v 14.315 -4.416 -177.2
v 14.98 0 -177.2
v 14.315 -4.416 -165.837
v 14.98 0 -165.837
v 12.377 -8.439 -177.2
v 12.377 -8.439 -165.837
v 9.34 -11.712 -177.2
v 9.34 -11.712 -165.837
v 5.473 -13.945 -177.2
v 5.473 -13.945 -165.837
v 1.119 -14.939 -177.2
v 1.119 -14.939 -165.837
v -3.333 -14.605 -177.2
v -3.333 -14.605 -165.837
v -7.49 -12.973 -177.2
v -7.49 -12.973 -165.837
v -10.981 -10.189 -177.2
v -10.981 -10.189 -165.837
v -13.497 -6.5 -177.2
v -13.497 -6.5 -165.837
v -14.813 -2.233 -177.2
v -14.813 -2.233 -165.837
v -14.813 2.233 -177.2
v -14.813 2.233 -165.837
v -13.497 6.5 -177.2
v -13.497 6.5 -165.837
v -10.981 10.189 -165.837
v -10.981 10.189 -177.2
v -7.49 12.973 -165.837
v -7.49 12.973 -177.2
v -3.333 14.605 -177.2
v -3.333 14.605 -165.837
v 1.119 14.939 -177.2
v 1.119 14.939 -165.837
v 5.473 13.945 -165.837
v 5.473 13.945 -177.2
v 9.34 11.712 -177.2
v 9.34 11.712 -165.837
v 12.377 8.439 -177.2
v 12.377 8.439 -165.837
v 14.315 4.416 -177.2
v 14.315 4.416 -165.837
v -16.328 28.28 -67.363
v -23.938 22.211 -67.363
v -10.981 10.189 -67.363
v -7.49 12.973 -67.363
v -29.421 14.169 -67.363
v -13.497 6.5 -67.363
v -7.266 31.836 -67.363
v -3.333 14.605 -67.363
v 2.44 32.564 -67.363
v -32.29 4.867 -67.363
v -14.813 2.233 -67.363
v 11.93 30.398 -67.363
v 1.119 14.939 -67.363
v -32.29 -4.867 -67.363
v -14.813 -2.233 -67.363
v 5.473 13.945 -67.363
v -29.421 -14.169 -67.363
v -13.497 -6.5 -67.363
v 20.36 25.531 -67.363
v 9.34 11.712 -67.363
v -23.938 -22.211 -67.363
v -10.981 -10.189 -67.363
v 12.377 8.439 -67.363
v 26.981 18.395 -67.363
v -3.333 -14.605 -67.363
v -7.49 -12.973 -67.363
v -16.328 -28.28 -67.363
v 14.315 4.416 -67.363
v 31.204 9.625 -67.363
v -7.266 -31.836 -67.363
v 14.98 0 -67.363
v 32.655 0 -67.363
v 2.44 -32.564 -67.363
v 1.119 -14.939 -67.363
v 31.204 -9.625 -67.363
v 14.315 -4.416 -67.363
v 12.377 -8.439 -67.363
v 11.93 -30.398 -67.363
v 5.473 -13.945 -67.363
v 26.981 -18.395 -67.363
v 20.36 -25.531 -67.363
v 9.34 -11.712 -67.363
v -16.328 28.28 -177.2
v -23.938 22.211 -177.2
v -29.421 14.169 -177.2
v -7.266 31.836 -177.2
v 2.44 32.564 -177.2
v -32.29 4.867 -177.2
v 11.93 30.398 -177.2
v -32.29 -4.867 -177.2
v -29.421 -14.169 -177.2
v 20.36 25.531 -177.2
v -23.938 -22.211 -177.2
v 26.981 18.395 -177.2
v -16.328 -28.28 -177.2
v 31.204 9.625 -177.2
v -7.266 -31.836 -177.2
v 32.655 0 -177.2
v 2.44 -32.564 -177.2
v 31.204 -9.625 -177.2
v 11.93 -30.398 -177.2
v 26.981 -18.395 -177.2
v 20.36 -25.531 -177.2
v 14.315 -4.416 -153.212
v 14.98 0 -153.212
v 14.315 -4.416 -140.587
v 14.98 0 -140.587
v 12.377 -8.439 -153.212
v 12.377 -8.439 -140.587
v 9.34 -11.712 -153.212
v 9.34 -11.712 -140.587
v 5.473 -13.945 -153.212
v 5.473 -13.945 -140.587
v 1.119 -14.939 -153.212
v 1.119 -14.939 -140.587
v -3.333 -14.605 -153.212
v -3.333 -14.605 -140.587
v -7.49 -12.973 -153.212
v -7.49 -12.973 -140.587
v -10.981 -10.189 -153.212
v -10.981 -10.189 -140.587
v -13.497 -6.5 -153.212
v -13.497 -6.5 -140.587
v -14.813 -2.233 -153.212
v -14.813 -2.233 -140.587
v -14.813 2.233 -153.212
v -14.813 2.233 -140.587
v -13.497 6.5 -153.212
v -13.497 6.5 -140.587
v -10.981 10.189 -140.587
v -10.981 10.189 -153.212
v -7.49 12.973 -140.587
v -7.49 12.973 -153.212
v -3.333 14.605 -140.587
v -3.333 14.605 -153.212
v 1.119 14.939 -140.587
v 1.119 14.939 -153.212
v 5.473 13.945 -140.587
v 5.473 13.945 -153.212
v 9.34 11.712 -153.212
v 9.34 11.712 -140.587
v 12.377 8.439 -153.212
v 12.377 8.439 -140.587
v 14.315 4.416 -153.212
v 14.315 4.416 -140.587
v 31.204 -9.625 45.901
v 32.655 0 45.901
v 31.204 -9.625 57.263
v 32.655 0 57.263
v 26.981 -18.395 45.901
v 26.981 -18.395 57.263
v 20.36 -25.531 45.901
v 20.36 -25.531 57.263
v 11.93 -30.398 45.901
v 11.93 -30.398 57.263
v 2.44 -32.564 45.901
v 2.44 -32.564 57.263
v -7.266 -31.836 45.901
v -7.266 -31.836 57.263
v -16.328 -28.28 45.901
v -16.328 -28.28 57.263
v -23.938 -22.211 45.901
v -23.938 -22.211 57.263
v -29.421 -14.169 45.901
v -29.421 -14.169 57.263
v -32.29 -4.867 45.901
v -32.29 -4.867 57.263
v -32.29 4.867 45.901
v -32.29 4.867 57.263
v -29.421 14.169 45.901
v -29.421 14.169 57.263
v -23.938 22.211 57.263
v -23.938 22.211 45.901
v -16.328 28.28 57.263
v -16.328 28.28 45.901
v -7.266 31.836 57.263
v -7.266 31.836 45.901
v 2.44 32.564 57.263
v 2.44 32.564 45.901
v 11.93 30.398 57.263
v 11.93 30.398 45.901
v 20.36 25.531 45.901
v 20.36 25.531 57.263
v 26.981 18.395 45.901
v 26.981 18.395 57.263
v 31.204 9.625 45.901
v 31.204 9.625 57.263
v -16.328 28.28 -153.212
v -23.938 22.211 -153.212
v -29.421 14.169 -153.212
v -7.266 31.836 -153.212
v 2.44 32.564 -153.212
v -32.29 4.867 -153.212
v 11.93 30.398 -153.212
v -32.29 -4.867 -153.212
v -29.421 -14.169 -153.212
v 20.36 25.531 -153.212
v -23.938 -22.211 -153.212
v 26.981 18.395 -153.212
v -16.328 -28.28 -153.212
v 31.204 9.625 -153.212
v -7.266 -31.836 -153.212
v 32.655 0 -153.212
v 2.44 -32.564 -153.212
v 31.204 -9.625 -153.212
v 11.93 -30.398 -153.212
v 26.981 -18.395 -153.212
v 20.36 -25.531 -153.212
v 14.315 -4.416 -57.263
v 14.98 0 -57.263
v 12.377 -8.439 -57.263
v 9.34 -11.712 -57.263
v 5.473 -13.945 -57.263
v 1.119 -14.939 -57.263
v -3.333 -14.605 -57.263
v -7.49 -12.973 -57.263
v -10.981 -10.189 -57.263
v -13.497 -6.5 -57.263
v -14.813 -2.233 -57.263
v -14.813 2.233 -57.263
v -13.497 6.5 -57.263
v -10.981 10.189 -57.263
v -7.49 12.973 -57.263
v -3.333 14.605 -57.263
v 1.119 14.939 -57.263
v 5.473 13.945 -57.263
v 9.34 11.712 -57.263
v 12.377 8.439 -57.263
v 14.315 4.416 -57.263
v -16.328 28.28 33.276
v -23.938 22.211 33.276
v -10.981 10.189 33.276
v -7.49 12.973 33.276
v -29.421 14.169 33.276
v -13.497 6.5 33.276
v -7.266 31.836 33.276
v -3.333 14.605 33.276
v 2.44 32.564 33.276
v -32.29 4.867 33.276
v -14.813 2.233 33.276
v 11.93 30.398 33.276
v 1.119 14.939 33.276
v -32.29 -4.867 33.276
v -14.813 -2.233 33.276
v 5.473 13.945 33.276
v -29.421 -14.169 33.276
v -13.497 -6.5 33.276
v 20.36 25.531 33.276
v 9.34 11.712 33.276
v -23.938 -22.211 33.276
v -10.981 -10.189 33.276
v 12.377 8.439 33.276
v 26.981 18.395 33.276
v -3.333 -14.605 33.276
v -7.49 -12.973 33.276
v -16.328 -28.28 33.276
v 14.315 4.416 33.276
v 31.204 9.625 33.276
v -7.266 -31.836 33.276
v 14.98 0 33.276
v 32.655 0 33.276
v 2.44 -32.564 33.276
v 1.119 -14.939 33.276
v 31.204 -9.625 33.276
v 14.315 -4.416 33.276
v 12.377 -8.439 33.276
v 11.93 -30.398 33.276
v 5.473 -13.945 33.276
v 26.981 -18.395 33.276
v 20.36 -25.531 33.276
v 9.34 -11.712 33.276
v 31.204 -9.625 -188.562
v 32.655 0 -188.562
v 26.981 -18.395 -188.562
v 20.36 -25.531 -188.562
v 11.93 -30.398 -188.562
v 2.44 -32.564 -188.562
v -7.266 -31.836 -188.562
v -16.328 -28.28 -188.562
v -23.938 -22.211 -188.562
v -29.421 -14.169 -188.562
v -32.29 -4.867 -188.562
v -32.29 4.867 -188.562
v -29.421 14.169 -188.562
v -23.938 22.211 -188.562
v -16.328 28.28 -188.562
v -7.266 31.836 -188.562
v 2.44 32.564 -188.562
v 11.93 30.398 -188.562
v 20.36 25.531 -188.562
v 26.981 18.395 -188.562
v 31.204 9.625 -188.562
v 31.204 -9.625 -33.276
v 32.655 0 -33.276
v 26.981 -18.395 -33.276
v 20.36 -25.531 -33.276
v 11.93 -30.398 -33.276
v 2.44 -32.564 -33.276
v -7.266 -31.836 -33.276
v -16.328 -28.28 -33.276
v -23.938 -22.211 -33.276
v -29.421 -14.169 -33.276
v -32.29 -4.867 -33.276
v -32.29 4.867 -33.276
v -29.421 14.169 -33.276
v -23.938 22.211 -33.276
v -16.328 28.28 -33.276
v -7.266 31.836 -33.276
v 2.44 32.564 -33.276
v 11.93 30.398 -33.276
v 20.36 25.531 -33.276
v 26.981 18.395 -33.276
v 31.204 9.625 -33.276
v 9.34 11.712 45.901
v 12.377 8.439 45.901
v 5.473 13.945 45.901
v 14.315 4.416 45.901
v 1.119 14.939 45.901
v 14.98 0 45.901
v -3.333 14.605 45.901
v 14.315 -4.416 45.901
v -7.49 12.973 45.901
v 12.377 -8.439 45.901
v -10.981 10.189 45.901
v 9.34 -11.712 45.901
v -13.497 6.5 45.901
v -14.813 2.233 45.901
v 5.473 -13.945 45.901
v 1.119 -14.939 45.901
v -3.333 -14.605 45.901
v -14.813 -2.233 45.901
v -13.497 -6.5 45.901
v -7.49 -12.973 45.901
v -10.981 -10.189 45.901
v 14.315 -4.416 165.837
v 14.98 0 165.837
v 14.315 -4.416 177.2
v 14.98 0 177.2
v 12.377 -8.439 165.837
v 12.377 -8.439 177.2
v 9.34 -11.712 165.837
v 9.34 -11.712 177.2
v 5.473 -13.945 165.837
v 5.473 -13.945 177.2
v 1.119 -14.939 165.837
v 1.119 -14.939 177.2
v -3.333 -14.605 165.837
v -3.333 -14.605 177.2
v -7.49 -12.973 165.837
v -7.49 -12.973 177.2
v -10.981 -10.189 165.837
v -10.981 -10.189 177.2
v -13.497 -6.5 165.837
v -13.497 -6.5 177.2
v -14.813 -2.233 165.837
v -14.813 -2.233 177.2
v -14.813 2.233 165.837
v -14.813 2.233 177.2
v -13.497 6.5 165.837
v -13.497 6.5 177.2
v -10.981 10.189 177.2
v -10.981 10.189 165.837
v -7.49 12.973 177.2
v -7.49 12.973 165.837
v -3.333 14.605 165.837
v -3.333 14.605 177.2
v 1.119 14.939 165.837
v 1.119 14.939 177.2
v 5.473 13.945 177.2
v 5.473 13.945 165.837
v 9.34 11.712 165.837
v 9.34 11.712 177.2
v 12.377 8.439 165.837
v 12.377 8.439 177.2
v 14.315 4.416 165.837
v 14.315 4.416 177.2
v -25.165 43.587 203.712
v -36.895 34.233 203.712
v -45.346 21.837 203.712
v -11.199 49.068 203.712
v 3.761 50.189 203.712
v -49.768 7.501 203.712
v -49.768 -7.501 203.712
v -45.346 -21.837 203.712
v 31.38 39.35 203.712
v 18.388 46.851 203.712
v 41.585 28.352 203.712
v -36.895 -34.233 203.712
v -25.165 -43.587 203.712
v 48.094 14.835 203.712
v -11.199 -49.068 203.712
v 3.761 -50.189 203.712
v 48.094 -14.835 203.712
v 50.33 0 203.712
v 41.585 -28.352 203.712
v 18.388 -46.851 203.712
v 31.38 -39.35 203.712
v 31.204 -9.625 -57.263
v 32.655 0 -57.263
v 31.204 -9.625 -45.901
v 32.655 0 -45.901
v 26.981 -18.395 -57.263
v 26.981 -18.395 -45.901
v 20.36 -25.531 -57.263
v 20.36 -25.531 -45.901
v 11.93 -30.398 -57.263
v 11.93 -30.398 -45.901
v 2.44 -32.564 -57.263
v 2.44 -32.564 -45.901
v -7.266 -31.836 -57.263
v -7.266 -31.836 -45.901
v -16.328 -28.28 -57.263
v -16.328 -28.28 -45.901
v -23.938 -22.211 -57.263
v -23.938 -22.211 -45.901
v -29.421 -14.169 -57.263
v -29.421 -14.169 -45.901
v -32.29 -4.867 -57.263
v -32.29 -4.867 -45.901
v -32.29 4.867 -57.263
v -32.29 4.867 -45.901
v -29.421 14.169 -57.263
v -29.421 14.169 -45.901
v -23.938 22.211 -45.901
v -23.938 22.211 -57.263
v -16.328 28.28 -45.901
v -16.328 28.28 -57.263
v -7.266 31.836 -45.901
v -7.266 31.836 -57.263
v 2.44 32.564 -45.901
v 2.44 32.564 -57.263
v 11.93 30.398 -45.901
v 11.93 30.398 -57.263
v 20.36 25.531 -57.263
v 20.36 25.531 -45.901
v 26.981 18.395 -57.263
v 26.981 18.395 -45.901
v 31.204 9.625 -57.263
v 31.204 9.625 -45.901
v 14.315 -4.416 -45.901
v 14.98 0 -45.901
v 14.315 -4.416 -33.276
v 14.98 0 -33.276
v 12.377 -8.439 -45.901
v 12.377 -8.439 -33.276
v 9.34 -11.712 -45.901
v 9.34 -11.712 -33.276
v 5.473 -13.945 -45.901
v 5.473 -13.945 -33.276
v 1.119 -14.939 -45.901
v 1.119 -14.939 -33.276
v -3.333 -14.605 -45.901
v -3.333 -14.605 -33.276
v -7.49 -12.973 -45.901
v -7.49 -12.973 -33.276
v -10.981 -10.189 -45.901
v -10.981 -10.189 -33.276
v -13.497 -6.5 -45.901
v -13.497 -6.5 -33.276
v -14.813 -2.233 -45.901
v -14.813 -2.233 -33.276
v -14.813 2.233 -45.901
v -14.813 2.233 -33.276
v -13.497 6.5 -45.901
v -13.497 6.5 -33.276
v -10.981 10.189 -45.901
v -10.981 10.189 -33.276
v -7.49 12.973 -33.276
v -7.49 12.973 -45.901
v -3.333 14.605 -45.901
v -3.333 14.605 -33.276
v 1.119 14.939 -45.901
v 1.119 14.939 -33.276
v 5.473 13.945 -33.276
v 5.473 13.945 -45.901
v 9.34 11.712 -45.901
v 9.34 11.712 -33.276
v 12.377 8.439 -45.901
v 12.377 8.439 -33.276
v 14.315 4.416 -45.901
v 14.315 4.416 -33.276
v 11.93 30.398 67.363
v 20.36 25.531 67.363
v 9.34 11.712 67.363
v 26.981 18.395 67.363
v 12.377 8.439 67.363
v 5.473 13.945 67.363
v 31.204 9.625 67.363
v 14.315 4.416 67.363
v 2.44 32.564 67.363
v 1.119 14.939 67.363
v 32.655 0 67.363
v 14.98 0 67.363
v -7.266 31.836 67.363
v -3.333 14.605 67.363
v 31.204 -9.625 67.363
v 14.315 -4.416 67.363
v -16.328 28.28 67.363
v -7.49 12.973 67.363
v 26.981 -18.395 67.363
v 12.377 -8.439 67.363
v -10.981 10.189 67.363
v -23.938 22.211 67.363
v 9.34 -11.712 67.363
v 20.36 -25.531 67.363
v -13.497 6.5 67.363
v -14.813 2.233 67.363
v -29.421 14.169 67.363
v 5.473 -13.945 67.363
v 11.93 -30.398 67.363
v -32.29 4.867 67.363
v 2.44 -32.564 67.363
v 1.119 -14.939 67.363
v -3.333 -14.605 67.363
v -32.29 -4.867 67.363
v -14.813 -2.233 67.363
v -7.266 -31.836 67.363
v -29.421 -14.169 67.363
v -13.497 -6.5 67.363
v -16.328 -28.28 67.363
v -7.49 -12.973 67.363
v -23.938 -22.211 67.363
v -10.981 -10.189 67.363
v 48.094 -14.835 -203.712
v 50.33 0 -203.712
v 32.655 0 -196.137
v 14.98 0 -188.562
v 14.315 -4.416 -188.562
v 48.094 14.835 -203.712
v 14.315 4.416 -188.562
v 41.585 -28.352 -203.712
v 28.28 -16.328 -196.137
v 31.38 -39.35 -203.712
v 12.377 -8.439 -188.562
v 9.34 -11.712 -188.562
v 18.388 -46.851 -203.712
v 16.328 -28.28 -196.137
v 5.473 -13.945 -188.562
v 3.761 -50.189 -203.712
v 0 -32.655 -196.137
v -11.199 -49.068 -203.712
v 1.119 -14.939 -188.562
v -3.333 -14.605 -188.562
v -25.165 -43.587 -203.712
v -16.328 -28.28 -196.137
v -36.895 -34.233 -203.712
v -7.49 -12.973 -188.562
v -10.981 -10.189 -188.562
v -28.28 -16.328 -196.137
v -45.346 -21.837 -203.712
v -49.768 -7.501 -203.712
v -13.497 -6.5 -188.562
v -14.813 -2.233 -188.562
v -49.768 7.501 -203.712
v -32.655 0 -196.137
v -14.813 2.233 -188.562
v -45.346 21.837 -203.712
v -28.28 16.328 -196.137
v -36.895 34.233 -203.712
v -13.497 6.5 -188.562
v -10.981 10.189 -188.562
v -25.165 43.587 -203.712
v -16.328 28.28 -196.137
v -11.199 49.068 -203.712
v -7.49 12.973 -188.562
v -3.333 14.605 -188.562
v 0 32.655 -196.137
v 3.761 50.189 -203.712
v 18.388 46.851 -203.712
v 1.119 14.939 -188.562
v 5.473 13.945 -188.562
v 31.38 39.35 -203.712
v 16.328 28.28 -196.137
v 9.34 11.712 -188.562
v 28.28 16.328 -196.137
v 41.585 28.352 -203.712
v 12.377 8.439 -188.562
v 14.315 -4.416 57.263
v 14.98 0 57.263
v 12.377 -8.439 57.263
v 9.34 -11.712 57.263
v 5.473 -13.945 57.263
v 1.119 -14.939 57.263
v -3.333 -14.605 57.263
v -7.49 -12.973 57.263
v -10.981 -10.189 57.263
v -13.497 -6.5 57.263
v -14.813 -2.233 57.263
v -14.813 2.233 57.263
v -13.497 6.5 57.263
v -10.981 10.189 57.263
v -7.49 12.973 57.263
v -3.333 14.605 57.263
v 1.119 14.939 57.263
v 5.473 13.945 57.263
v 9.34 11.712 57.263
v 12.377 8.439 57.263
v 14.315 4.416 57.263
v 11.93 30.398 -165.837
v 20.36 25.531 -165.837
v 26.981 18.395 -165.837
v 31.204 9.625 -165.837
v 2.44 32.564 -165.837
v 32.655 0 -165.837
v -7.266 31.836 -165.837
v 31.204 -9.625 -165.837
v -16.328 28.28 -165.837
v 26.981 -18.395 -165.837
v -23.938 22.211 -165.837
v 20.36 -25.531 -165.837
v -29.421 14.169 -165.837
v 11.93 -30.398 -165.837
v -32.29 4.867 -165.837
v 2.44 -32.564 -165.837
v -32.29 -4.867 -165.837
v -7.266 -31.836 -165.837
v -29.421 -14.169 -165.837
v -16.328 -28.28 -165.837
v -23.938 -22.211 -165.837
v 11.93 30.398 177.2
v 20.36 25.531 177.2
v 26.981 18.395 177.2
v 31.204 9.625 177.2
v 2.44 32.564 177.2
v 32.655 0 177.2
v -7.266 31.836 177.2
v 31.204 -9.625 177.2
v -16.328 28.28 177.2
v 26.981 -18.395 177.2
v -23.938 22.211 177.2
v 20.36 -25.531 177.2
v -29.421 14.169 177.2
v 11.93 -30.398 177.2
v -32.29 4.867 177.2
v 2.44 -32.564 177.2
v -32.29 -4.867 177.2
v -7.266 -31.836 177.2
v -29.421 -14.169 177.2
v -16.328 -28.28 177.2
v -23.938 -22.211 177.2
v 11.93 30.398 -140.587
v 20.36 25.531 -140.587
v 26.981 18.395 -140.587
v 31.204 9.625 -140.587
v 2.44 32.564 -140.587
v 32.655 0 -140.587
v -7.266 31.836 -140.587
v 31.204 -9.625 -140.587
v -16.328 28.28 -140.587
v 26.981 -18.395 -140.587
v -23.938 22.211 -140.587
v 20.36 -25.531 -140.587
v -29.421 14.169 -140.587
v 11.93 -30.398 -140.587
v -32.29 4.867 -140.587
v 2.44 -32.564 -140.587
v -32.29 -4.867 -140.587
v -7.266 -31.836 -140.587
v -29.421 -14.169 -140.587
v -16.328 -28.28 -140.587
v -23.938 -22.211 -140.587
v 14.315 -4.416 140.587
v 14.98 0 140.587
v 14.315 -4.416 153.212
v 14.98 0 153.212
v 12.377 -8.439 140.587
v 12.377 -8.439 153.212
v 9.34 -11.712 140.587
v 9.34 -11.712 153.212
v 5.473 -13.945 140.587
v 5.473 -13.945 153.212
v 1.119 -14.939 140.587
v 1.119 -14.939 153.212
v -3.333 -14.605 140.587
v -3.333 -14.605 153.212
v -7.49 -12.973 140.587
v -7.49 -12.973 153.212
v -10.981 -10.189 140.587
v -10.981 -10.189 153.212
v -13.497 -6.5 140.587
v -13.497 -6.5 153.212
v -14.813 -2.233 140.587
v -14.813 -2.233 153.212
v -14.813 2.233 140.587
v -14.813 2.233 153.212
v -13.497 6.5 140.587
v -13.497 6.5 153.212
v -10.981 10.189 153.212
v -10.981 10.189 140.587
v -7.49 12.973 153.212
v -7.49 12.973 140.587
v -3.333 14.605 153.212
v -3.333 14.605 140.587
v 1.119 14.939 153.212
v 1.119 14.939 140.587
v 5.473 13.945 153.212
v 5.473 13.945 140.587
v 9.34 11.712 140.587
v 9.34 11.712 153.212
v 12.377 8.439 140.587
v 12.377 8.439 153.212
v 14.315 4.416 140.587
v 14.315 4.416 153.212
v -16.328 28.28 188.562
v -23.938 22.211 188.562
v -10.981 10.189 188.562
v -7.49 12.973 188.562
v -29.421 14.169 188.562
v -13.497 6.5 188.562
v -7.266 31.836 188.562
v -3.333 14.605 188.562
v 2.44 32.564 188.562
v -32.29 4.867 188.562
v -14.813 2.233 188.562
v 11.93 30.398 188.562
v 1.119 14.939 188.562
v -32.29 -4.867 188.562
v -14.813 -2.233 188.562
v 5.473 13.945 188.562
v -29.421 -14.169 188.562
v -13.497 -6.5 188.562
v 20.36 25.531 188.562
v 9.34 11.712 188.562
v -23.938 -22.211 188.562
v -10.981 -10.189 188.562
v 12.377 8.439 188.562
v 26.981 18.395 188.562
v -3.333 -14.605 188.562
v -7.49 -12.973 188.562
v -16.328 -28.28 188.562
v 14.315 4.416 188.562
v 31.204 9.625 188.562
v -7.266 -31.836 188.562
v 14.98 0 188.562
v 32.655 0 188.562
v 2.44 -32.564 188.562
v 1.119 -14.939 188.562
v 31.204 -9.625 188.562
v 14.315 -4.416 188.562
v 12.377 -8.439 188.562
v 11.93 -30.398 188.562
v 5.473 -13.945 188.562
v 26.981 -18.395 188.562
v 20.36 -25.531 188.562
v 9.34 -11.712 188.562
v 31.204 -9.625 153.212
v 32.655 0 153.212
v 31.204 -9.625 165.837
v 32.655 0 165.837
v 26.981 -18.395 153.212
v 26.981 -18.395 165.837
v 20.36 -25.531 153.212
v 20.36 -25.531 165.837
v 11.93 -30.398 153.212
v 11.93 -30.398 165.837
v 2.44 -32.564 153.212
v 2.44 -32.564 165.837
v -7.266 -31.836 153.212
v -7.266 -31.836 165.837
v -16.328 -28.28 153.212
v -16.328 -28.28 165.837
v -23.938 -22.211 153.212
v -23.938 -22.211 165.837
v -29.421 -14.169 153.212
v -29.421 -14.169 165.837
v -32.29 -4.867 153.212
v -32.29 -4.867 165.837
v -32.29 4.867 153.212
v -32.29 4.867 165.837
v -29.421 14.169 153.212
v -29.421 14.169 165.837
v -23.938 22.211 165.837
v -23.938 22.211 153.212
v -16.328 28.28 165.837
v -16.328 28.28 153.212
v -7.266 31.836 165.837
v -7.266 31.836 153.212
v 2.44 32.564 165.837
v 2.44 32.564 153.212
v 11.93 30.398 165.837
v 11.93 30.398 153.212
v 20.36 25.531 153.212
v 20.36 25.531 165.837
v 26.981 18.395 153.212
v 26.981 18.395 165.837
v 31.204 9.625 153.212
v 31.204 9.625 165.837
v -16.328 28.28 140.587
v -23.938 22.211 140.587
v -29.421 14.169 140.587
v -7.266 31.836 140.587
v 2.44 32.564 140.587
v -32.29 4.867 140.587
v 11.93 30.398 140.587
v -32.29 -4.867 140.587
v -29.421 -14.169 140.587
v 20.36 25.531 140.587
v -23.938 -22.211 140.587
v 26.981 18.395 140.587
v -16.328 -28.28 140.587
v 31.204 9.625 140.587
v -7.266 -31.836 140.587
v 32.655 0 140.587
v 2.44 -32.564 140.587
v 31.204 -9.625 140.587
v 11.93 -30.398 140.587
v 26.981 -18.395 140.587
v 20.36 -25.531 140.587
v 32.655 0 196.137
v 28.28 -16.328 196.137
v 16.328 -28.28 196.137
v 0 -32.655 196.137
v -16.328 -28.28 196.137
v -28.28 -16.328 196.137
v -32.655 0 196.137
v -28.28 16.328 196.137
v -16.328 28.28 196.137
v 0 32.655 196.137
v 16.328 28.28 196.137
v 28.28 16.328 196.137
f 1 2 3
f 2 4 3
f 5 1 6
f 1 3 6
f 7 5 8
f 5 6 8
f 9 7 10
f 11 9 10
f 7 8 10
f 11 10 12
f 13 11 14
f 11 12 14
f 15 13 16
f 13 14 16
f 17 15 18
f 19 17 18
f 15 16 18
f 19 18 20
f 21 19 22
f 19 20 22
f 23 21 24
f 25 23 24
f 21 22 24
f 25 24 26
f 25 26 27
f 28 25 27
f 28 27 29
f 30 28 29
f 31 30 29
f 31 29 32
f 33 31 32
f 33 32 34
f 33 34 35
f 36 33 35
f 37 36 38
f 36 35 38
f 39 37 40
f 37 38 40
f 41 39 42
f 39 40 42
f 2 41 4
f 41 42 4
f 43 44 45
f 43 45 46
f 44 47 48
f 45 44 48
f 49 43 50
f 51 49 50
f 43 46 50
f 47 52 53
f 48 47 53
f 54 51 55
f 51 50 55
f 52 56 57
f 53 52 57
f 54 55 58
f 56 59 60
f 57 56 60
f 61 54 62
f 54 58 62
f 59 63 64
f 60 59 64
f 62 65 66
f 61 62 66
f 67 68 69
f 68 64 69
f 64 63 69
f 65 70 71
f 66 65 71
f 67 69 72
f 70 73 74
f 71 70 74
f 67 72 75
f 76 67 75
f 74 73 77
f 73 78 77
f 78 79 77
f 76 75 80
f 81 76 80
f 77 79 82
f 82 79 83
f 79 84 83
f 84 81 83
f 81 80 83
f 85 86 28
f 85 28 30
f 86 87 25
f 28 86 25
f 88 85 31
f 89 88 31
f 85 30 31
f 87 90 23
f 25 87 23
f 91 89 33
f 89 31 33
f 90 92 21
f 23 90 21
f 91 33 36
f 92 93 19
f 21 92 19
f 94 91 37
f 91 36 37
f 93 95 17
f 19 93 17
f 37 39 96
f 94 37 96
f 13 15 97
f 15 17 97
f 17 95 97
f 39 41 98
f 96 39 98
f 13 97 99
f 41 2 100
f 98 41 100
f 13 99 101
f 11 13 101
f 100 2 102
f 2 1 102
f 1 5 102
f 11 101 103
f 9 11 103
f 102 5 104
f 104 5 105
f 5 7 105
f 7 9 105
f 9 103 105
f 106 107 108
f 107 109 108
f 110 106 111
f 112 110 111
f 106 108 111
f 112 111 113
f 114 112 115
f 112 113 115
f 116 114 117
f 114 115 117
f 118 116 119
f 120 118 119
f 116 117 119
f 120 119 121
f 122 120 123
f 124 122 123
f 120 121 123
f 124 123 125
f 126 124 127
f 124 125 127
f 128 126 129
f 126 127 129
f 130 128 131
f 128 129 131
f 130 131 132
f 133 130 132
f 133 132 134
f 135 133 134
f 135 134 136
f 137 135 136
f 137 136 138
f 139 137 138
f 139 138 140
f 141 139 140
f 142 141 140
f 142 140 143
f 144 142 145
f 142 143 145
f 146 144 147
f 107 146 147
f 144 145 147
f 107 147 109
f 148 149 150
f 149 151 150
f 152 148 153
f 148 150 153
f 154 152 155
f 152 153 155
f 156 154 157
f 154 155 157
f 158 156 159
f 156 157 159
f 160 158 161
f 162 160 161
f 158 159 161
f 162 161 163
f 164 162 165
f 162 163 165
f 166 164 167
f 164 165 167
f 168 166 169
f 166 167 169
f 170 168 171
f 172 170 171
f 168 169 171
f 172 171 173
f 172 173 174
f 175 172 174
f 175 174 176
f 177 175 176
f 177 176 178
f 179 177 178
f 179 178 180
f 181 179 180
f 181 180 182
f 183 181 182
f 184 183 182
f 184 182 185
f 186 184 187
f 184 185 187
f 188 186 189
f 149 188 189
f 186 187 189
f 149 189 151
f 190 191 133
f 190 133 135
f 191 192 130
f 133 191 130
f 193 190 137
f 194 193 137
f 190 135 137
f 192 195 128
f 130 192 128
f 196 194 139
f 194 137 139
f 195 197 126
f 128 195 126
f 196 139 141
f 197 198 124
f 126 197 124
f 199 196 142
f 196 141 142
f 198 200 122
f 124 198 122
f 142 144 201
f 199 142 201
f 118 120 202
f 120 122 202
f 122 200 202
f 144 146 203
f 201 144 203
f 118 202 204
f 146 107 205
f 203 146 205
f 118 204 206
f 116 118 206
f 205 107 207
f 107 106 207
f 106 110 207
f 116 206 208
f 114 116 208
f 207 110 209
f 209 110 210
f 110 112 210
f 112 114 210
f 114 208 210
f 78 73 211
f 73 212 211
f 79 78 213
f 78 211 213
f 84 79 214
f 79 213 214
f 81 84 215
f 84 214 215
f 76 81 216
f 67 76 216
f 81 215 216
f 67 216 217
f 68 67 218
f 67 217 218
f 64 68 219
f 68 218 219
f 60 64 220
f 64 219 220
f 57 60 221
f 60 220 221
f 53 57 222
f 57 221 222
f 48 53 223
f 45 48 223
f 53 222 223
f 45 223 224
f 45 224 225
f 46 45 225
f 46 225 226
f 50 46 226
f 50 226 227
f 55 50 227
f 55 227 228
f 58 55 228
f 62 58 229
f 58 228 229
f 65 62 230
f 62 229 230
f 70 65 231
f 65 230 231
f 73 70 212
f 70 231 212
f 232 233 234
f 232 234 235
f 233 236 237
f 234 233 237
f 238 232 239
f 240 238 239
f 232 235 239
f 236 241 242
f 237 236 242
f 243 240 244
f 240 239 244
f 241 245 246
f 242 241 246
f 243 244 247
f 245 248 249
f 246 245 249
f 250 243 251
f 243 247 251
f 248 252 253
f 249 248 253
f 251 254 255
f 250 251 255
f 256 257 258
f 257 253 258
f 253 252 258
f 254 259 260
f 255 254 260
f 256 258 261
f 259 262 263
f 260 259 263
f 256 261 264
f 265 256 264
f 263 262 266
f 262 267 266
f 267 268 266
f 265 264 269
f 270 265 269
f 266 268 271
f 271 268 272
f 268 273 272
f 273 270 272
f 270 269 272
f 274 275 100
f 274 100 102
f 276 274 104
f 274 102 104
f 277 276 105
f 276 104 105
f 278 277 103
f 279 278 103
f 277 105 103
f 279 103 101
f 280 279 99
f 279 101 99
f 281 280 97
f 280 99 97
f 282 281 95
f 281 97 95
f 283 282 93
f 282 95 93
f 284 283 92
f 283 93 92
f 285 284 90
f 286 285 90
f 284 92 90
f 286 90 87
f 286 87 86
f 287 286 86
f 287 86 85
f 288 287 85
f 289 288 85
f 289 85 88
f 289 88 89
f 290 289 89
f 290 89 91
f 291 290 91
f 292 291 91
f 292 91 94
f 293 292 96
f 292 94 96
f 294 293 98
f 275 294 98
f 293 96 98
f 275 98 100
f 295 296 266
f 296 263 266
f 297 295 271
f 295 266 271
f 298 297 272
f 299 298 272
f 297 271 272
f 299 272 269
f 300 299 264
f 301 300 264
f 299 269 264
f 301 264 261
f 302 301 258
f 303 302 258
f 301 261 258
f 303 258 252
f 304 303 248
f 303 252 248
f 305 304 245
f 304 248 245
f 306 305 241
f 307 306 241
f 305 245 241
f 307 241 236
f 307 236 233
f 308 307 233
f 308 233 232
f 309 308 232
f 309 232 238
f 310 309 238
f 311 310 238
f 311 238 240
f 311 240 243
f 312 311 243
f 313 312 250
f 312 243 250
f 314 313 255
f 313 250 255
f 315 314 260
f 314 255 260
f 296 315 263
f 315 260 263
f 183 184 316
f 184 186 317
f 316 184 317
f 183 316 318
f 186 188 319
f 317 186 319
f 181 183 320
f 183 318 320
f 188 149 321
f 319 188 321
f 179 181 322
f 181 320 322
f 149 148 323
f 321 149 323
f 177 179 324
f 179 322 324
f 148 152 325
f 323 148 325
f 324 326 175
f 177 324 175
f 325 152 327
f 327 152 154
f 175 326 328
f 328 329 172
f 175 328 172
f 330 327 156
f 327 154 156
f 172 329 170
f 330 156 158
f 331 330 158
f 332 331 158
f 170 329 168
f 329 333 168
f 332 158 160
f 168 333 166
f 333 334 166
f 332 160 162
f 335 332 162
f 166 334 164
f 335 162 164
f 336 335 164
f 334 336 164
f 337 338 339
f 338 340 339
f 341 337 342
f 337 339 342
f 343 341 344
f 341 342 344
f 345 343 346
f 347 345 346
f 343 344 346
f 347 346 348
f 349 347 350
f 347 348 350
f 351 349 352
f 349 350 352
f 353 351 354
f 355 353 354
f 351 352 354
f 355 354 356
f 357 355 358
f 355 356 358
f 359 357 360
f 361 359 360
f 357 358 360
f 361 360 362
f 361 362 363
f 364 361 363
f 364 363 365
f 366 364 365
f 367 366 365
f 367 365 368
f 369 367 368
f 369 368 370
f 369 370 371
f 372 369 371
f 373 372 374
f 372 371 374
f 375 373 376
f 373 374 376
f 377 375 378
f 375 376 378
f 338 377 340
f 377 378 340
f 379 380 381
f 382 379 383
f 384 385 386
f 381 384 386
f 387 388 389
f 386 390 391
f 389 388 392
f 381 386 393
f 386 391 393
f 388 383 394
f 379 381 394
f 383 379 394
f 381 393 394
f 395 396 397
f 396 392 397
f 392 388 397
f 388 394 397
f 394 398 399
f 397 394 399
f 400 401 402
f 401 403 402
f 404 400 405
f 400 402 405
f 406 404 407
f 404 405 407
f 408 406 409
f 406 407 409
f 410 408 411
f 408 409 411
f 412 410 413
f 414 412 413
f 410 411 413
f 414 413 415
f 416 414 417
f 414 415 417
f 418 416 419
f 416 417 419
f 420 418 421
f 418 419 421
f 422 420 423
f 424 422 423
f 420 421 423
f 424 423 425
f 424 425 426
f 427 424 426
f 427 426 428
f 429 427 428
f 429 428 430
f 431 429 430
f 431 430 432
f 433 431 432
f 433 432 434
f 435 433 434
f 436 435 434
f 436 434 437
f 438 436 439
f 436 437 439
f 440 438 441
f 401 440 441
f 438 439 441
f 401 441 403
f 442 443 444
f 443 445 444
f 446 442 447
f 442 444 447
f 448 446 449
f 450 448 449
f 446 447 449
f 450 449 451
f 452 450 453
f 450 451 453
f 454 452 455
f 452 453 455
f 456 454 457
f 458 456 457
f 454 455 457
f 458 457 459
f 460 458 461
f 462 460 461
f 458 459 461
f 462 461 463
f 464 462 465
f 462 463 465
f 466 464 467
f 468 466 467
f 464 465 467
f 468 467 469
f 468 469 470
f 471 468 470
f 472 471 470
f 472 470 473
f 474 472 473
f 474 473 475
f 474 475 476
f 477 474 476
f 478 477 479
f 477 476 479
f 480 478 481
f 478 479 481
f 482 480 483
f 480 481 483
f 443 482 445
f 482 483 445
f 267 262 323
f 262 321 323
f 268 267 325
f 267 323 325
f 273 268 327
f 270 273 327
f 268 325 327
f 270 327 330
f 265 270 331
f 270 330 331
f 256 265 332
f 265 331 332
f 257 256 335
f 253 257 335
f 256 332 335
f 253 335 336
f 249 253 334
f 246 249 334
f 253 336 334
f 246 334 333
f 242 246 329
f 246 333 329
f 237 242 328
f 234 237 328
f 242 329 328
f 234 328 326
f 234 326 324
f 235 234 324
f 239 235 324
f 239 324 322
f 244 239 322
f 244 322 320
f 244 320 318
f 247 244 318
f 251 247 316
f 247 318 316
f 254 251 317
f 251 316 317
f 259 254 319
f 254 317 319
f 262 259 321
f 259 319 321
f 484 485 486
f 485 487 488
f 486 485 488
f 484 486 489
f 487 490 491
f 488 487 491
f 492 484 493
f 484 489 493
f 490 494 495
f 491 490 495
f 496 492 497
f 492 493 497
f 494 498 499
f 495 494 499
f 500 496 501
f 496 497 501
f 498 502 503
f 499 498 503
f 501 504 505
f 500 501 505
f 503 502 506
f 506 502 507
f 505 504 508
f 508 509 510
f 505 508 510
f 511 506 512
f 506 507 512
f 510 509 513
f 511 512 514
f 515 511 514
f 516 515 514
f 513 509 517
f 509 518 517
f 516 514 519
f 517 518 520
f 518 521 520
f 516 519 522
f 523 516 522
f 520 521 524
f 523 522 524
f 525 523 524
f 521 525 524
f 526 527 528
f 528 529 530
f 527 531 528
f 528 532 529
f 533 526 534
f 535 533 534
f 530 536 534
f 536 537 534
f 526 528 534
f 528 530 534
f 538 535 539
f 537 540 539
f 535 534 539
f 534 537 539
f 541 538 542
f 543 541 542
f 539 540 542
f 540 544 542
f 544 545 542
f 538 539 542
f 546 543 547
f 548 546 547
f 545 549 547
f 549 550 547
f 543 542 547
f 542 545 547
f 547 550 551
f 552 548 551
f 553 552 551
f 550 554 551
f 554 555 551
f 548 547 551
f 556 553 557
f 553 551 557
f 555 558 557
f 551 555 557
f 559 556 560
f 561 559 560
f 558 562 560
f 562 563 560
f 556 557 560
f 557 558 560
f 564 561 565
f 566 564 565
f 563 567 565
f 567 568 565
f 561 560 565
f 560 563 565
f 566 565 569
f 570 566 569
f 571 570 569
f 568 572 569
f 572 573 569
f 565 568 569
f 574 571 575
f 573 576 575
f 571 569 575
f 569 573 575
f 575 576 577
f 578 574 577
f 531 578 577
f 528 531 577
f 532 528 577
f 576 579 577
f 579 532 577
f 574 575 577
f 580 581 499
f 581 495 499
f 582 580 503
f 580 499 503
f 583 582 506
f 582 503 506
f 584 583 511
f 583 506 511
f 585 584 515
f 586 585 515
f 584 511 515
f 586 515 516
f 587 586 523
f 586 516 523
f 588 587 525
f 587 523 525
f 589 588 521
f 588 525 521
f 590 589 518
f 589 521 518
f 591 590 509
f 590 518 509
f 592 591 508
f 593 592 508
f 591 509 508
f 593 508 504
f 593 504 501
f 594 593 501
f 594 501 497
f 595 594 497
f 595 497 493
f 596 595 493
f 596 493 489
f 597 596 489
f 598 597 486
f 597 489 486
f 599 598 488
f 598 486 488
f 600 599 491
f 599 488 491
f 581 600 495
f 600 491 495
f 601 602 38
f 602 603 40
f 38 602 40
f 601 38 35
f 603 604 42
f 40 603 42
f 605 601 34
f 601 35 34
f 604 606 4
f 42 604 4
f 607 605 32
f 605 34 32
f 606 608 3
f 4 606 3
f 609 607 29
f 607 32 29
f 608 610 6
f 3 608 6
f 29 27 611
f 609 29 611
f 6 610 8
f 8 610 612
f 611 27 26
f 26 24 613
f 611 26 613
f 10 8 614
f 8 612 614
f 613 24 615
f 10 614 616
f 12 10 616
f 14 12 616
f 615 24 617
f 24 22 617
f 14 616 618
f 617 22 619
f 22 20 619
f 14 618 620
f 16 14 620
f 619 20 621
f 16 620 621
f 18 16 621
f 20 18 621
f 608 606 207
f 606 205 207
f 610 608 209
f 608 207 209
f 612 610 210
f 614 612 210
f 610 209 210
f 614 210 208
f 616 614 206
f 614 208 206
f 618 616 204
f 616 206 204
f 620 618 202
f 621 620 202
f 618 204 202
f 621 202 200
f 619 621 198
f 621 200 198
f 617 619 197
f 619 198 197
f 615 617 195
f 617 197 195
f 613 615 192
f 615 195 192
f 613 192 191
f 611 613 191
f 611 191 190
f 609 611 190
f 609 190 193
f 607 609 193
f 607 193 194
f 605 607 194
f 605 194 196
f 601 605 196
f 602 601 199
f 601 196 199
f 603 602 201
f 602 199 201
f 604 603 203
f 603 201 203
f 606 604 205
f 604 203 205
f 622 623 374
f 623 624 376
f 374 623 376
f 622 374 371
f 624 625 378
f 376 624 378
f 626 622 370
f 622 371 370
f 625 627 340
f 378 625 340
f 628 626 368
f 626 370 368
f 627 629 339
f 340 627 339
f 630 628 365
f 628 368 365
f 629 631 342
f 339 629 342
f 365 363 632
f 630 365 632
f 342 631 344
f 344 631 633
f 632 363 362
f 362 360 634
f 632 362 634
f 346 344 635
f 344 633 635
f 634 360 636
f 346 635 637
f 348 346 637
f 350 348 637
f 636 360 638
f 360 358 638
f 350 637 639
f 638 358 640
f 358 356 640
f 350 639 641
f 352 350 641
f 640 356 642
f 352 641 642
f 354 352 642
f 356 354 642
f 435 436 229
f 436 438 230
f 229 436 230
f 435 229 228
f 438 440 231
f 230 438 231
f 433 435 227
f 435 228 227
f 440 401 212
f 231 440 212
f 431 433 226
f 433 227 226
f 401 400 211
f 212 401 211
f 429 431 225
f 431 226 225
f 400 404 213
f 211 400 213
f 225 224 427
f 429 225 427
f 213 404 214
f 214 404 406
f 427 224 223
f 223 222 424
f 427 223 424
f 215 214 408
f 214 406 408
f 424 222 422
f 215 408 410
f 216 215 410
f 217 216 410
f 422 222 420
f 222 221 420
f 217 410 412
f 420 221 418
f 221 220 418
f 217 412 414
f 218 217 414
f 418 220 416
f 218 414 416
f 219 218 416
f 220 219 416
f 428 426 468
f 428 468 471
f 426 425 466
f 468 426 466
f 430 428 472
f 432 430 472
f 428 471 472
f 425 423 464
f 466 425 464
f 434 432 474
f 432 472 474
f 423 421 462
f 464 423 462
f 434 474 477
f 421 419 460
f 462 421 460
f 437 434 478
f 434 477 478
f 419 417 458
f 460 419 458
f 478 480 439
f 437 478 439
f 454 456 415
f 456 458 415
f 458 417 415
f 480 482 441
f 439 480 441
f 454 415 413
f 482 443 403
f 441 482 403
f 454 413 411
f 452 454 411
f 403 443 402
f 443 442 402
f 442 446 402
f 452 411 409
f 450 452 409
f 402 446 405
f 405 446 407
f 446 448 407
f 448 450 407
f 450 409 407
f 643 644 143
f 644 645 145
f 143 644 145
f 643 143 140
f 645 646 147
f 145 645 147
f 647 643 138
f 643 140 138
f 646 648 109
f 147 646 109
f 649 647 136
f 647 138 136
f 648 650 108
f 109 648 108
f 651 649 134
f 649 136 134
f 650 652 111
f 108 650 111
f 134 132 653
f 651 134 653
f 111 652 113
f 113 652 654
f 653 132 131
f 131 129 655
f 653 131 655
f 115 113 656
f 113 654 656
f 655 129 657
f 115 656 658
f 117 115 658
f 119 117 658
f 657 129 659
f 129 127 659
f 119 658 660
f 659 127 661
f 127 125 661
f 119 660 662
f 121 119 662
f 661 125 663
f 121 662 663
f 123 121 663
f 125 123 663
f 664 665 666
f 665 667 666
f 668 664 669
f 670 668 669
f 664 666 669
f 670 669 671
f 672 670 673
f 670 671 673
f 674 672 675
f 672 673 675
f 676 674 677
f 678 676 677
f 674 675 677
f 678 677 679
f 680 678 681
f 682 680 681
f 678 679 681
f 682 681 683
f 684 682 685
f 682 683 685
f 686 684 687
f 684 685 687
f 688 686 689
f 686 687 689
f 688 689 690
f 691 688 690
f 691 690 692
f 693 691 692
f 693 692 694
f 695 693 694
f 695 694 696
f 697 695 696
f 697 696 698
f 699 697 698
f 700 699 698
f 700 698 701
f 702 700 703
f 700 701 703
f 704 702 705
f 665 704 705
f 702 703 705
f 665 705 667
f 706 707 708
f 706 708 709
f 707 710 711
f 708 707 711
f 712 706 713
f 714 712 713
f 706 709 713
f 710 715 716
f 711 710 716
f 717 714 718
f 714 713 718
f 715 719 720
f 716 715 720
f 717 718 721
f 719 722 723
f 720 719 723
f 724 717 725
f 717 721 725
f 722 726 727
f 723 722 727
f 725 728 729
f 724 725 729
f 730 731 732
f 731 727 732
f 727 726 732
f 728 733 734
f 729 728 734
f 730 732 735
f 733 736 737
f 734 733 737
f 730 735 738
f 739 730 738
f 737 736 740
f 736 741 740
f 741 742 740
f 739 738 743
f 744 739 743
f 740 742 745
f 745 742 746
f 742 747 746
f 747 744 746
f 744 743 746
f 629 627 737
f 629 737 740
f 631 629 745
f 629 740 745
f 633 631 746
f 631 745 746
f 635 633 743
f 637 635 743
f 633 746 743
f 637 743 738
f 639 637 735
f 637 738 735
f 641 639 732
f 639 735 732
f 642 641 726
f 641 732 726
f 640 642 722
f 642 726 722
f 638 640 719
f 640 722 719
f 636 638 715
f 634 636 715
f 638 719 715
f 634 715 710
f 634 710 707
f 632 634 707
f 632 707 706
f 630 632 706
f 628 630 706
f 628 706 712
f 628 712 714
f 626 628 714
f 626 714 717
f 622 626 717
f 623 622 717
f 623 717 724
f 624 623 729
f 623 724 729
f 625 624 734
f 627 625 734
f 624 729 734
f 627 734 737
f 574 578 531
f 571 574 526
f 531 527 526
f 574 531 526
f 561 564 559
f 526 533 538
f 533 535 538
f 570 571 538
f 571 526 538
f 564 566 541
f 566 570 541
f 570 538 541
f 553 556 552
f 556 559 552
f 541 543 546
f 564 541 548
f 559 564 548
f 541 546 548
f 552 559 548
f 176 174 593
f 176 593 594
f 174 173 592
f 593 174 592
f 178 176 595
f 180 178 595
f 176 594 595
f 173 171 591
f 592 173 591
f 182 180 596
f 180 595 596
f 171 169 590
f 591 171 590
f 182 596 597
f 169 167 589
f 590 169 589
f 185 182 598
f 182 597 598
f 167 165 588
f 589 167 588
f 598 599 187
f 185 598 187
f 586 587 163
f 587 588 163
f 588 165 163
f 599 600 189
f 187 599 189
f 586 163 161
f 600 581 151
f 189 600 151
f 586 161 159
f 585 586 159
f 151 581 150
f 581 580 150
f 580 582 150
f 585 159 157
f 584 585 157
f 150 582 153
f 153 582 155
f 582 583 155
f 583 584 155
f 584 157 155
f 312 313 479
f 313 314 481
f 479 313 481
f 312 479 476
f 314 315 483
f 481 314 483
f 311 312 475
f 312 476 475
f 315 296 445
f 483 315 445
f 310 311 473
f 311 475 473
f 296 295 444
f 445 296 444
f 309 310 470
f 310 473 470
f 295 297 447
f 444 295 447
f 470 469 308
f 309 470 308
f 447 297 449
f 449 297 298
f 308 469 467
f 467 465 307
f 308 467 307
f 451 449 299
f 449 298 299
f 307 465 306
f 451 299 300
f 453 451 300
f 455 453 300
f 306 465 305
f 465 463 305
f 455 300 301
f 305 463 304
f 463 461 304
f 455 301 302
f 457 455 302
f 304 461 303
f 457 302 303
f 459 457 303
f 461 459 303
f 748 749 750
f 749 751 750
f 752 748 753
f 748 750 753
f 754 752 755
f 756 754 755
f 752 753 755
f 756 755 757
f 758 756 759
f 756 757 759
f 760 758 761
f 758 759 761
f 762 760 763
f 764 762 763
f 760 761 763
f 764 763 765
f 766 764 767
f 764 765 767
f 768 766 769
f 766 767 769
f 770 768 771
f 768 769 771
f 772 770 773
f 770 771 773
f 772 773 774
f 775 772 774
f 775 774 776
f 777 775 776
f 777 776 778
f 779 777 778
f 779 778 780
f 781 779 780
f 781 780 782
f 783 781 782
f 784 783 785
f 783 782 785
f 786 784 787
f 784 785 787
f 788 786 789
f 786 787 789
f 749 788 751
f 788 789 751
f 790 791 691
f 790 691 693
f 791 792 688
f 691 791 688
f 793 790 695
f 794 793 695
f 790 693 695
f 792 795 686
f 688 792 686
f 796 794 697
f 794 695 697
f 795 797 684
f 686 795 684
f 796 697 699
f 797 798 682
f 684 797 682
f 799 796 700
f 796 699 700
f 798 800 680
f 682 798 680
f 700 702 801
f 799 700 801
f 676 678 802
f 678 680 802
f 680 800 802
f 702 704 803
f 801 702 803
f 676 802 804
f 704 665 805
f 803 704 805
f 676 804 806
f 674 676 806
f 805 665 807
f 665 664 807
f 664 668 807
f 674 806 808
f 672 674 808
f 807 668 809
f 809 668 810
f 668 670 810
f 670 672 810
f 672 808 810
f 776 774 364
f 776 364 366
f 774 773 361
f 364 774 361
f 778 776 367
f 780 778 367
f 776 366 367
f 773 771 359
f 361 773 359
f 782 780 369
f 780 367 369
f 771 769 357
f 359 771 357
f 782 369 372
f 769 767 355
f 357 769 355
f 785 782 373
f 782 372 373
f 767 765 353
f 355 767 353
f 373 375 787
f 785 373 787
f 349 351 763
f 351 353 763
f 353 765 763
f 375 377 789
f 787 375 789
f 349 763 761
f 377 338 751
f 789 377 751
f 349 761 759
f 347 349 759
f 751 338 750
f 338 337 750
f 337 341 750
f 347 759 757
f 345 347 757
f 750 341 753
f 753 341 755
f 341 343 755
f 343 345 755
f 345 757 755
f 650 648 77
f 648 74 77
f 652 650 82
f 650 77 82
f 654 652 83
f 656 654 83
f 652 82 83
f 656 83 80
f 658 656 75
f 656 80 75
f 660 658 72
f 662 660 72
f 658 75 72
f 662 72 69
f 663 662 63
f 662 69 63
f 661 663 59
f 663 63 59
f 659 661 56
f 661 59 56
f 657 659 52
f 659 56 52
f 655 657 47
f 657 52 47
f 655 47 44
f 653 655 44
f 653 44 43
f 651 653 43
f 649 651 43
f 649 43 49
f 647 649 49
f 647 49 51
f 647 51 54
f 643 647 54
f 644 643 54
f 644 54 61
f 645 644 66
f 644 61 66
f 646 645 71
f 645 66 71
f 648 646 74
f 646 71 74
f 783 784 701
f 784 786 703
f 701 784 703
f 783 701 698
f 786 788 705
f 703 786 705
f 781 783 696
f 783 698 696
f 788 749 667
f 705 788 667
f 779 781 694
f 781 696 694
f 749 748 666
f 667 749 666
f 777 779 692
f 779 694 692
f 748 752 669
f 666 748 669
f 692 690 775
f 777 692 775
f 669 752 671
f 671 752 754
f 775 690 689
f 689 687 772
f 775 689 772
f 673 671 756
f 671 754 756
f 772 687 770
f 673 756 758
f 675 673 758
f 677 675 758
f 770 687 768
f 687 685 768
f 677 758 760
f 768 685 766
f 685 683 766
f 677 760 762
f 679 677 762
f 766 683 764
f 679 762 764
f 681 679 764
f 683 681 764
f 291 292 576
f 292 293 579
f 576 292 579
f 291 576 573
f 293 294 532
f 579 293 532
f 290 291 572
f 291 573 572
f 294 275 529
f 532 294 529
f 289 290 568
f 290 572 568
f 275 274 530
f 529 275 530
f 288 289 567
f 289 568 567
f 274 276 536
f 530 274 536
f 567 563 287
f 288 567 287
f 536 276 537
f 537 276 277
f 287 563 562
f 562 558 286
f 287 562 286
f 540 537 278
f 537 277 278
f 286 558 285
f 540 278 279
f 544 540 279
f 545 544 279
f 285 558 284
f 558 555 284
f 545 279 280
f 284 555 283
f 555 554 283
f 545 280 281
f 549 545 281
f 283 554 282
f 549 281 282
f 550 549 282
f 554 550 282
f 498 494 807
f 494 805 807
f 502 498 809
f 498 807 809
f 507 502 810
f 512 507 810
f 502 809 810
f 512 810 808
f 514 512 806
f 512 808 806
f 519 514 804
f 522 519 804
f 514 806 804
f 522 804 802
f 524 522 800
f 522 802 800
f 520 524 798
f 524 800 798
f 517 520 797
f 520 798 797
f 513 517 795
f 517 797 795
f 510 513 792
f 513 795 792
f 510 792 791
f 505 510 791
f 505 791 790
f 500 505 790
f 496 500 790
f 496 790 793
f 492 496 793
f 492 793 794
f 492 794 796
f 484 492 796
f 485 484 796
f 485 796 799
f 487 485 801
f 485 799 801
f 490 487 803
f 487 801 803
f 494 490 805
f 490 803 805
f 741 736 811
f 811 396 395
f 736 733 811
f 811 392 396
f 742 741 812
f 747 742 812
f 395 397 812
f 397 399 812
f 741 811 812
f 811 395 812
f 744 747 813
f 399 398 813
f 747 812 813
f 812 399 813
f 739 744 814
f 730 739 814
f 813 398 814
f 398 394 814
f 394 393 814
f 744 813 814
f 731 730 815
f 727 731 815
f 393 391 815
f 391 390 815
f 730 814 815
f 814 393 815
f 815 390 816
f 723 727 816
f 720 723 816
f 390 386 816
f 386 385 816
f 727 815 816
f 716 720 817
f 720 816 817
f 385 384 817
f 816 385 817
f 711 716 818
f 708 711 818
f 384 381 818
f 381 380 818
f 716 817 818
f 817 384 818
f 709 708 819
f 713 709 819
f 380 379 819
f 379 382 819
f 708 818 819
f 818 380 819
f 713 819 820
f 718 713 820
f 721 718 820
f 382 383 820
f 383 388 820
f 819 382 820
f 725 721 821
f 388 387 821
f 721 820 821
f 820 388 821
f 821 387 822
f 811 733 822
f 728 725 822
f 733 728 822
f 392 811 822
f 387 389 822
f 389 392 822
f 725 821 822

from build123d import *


with BuildPart() as f1:
    # F0 (on Front) → F1 (revolve)
    with BuildSketch(Plane.XZ):
        Polygon((0, 203.711763), (0, 0), (32.655226, 0), (32.655226, 33.276252), (14.980431, 33.276252), (14.980431, 45.901109), (32.655226, 45.901109), (32.655226, 57.263475), (14.980431, 57.263475), (14.980431, 67.363359), (32.655226, 67.363359), (32.655226, 140.587494), (14.980431, 140.587494), (14.980431, 153.212354), (32.655226, 153.212354), (32.655226, 165.837198), (14.980431, 165.837198), (14.980431, 177.199572), (32.655226, 177.199572), (32.655226, 188.561946), (14.980431, 188.561946), (50.33002, 203.711763), align=None)
        Polygon((32.655226, 0), (0, 0), (0, -203.711763), (50.33002, -203.711763), (14.980431, -188.561946), (32.655226, -188.561946), (32.655226, -177.199572), (14.980431, -177.199572), (14.980431, -165.837198), (32.655226, -165.837198), (32.655226, -153.212354), (14.980431, -153.212354), (14.980431, -140.587494), (32.655226, -140.587494), (32.655226, -67.363359), (14.980431, -67.363359), (14.980431, -57.263475), (32.655226, -57.263475), (32.655226, -45.901109), (14.980431, -45.901109), (14.980431, -33.276252), (32.655226, -33.276252), align=None)
    revolve(axis=Axis((0, 0, -101.855882), (0, 0, -1)))


solid = f1.part
